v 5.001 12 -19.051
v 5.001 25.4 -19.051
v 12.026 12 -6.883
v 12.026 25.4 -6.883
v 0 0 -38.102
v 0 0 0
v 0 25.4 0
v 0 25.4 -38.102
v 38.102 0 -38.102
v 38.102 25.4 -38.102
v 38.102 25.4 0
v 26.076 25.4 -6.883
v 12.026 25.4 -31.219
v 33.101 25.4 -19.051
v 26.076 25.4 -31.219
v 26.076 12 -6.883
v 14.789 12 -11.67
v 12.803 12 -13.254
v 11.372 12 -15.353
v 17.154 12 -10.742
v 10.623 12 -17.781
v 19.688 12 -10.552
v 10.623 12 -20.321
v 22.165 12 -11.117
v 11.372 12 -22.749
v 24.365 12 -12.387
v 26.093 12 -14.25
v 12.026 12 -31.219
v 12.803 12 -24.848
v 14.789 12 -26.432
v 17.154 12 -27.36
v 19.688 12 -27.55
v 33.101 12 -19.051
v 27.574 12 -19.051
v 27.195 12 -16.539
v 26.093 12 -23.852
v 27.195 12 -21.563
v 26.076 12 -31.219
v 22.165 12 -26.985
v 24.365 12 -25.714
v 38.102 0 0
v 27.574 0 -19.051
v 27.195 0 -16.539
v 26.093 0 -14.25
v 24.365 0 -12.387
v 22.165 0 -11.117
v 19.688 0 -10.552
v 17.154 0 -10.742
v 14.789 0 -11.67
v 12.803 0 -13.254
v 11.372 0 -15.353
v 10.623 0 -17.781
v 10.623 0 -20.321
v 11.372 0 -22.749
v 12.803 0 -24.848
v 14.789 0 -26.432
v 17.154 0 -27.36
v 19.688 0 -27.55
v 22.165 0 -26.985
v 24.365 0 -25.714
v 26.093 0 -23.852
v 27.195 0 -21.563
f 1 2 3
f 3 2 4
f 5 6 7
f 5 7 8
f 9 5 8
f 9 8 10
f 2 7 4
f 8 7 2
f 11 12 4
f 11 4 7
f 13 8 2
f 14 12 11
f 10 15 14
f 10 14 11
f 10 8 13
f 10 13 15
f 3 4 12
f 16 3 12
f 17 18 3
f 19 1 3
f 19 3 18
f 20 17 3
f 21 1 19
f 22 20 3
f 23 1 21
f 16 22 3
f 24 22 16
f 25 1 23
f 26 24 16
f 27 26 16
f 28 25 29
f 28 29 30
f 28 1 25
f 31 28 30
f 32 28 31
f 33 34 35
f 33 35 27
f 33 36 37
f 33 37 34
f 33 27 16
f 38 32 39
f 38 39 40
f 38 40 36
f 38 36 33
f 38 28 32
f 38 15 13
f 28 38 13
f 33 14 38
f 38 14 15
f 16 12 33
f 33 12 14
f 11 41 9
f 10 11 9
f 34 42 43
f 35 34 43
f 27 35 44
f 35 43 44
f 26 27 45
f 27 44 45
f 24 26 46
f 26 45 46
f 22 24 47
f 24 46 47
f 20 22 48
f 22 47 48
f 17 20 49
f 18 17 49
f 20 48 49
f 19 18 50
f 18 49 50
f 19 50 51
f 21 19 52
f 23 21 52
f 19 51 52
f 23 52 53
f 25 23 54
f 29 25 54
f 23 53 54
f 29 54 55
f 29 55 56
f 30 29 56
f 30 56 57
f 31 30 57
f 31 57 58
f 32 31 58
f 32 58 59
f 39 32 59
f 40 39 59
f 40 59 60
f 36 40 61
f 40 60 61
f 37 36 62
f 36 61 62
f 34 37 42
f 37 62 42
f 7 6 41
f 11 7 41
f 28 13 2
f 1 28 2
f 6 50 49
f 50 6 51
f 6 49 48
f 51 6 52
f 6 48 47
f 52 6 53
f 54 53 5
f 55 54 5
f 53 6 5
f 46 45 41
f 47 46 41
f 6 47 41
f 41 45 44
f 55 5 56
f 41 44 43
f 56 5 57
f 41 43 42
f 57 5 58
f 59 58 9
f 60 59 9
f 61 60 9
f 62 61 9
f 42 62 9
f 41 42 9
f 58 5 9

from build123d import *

# Parameters (mm, degrees)
SKETCH1_W           = 38.101827682
SKETCH1_H           = 38.101827682
BOSS_EXTRUDE1_DEPTH = 25.4
CUT_EXTRUDE1_DEPTH  = 13.4
SKETCH4_R           = 8.523044684
CUT_EXTRUDE2_DEPTH  = 12


with BuildPart() as part:
    # Sketch1 → Boss-Extrude1 (new body)
    with BuildSketch(Plane(origin=(0, 0, 0), x_dir=(1, 0, 0), z_dir=(0, 1, 0))):
        with Locations((19.050913841, 19.050913841)):
            Rectangle(SKETCH1_W, SKETCH1_H)
    extrude(amount=BOSS_EXTRUDE1_DEPTH)

    # Sketch2 → Cut-Extrude1 (cut)
    with BuildSketch(Plane(origin=(0, 25.4, 0), x_dir=(1, 0, 0), z_dir=(0, 1, 0))):
        Polygon((33.100912857, 19.050913841), (26.075913349, 31.218569912), (12.025914333, 31.218569912), (5.000914826, 19.050913841), (12.025914333, 6.883257771), (26.075913349, 6.883257771), align=None)
    extrude(amount=-CUT_EXTRUDE1_DEPTH, mode=Mode.SUBTRACT)

    # Sketch4 → Cut-Extrude2 (cut)
    with BuildSketch(Plane.XZ):
        with Locations((19.050913841, -19.050913841)):
            Circle(SKETCH4_R)
    extrude(amount=-CUT_EXTRUDE2_DEPTH, mode=Mode.SUBTRACT)


solid = part.part
